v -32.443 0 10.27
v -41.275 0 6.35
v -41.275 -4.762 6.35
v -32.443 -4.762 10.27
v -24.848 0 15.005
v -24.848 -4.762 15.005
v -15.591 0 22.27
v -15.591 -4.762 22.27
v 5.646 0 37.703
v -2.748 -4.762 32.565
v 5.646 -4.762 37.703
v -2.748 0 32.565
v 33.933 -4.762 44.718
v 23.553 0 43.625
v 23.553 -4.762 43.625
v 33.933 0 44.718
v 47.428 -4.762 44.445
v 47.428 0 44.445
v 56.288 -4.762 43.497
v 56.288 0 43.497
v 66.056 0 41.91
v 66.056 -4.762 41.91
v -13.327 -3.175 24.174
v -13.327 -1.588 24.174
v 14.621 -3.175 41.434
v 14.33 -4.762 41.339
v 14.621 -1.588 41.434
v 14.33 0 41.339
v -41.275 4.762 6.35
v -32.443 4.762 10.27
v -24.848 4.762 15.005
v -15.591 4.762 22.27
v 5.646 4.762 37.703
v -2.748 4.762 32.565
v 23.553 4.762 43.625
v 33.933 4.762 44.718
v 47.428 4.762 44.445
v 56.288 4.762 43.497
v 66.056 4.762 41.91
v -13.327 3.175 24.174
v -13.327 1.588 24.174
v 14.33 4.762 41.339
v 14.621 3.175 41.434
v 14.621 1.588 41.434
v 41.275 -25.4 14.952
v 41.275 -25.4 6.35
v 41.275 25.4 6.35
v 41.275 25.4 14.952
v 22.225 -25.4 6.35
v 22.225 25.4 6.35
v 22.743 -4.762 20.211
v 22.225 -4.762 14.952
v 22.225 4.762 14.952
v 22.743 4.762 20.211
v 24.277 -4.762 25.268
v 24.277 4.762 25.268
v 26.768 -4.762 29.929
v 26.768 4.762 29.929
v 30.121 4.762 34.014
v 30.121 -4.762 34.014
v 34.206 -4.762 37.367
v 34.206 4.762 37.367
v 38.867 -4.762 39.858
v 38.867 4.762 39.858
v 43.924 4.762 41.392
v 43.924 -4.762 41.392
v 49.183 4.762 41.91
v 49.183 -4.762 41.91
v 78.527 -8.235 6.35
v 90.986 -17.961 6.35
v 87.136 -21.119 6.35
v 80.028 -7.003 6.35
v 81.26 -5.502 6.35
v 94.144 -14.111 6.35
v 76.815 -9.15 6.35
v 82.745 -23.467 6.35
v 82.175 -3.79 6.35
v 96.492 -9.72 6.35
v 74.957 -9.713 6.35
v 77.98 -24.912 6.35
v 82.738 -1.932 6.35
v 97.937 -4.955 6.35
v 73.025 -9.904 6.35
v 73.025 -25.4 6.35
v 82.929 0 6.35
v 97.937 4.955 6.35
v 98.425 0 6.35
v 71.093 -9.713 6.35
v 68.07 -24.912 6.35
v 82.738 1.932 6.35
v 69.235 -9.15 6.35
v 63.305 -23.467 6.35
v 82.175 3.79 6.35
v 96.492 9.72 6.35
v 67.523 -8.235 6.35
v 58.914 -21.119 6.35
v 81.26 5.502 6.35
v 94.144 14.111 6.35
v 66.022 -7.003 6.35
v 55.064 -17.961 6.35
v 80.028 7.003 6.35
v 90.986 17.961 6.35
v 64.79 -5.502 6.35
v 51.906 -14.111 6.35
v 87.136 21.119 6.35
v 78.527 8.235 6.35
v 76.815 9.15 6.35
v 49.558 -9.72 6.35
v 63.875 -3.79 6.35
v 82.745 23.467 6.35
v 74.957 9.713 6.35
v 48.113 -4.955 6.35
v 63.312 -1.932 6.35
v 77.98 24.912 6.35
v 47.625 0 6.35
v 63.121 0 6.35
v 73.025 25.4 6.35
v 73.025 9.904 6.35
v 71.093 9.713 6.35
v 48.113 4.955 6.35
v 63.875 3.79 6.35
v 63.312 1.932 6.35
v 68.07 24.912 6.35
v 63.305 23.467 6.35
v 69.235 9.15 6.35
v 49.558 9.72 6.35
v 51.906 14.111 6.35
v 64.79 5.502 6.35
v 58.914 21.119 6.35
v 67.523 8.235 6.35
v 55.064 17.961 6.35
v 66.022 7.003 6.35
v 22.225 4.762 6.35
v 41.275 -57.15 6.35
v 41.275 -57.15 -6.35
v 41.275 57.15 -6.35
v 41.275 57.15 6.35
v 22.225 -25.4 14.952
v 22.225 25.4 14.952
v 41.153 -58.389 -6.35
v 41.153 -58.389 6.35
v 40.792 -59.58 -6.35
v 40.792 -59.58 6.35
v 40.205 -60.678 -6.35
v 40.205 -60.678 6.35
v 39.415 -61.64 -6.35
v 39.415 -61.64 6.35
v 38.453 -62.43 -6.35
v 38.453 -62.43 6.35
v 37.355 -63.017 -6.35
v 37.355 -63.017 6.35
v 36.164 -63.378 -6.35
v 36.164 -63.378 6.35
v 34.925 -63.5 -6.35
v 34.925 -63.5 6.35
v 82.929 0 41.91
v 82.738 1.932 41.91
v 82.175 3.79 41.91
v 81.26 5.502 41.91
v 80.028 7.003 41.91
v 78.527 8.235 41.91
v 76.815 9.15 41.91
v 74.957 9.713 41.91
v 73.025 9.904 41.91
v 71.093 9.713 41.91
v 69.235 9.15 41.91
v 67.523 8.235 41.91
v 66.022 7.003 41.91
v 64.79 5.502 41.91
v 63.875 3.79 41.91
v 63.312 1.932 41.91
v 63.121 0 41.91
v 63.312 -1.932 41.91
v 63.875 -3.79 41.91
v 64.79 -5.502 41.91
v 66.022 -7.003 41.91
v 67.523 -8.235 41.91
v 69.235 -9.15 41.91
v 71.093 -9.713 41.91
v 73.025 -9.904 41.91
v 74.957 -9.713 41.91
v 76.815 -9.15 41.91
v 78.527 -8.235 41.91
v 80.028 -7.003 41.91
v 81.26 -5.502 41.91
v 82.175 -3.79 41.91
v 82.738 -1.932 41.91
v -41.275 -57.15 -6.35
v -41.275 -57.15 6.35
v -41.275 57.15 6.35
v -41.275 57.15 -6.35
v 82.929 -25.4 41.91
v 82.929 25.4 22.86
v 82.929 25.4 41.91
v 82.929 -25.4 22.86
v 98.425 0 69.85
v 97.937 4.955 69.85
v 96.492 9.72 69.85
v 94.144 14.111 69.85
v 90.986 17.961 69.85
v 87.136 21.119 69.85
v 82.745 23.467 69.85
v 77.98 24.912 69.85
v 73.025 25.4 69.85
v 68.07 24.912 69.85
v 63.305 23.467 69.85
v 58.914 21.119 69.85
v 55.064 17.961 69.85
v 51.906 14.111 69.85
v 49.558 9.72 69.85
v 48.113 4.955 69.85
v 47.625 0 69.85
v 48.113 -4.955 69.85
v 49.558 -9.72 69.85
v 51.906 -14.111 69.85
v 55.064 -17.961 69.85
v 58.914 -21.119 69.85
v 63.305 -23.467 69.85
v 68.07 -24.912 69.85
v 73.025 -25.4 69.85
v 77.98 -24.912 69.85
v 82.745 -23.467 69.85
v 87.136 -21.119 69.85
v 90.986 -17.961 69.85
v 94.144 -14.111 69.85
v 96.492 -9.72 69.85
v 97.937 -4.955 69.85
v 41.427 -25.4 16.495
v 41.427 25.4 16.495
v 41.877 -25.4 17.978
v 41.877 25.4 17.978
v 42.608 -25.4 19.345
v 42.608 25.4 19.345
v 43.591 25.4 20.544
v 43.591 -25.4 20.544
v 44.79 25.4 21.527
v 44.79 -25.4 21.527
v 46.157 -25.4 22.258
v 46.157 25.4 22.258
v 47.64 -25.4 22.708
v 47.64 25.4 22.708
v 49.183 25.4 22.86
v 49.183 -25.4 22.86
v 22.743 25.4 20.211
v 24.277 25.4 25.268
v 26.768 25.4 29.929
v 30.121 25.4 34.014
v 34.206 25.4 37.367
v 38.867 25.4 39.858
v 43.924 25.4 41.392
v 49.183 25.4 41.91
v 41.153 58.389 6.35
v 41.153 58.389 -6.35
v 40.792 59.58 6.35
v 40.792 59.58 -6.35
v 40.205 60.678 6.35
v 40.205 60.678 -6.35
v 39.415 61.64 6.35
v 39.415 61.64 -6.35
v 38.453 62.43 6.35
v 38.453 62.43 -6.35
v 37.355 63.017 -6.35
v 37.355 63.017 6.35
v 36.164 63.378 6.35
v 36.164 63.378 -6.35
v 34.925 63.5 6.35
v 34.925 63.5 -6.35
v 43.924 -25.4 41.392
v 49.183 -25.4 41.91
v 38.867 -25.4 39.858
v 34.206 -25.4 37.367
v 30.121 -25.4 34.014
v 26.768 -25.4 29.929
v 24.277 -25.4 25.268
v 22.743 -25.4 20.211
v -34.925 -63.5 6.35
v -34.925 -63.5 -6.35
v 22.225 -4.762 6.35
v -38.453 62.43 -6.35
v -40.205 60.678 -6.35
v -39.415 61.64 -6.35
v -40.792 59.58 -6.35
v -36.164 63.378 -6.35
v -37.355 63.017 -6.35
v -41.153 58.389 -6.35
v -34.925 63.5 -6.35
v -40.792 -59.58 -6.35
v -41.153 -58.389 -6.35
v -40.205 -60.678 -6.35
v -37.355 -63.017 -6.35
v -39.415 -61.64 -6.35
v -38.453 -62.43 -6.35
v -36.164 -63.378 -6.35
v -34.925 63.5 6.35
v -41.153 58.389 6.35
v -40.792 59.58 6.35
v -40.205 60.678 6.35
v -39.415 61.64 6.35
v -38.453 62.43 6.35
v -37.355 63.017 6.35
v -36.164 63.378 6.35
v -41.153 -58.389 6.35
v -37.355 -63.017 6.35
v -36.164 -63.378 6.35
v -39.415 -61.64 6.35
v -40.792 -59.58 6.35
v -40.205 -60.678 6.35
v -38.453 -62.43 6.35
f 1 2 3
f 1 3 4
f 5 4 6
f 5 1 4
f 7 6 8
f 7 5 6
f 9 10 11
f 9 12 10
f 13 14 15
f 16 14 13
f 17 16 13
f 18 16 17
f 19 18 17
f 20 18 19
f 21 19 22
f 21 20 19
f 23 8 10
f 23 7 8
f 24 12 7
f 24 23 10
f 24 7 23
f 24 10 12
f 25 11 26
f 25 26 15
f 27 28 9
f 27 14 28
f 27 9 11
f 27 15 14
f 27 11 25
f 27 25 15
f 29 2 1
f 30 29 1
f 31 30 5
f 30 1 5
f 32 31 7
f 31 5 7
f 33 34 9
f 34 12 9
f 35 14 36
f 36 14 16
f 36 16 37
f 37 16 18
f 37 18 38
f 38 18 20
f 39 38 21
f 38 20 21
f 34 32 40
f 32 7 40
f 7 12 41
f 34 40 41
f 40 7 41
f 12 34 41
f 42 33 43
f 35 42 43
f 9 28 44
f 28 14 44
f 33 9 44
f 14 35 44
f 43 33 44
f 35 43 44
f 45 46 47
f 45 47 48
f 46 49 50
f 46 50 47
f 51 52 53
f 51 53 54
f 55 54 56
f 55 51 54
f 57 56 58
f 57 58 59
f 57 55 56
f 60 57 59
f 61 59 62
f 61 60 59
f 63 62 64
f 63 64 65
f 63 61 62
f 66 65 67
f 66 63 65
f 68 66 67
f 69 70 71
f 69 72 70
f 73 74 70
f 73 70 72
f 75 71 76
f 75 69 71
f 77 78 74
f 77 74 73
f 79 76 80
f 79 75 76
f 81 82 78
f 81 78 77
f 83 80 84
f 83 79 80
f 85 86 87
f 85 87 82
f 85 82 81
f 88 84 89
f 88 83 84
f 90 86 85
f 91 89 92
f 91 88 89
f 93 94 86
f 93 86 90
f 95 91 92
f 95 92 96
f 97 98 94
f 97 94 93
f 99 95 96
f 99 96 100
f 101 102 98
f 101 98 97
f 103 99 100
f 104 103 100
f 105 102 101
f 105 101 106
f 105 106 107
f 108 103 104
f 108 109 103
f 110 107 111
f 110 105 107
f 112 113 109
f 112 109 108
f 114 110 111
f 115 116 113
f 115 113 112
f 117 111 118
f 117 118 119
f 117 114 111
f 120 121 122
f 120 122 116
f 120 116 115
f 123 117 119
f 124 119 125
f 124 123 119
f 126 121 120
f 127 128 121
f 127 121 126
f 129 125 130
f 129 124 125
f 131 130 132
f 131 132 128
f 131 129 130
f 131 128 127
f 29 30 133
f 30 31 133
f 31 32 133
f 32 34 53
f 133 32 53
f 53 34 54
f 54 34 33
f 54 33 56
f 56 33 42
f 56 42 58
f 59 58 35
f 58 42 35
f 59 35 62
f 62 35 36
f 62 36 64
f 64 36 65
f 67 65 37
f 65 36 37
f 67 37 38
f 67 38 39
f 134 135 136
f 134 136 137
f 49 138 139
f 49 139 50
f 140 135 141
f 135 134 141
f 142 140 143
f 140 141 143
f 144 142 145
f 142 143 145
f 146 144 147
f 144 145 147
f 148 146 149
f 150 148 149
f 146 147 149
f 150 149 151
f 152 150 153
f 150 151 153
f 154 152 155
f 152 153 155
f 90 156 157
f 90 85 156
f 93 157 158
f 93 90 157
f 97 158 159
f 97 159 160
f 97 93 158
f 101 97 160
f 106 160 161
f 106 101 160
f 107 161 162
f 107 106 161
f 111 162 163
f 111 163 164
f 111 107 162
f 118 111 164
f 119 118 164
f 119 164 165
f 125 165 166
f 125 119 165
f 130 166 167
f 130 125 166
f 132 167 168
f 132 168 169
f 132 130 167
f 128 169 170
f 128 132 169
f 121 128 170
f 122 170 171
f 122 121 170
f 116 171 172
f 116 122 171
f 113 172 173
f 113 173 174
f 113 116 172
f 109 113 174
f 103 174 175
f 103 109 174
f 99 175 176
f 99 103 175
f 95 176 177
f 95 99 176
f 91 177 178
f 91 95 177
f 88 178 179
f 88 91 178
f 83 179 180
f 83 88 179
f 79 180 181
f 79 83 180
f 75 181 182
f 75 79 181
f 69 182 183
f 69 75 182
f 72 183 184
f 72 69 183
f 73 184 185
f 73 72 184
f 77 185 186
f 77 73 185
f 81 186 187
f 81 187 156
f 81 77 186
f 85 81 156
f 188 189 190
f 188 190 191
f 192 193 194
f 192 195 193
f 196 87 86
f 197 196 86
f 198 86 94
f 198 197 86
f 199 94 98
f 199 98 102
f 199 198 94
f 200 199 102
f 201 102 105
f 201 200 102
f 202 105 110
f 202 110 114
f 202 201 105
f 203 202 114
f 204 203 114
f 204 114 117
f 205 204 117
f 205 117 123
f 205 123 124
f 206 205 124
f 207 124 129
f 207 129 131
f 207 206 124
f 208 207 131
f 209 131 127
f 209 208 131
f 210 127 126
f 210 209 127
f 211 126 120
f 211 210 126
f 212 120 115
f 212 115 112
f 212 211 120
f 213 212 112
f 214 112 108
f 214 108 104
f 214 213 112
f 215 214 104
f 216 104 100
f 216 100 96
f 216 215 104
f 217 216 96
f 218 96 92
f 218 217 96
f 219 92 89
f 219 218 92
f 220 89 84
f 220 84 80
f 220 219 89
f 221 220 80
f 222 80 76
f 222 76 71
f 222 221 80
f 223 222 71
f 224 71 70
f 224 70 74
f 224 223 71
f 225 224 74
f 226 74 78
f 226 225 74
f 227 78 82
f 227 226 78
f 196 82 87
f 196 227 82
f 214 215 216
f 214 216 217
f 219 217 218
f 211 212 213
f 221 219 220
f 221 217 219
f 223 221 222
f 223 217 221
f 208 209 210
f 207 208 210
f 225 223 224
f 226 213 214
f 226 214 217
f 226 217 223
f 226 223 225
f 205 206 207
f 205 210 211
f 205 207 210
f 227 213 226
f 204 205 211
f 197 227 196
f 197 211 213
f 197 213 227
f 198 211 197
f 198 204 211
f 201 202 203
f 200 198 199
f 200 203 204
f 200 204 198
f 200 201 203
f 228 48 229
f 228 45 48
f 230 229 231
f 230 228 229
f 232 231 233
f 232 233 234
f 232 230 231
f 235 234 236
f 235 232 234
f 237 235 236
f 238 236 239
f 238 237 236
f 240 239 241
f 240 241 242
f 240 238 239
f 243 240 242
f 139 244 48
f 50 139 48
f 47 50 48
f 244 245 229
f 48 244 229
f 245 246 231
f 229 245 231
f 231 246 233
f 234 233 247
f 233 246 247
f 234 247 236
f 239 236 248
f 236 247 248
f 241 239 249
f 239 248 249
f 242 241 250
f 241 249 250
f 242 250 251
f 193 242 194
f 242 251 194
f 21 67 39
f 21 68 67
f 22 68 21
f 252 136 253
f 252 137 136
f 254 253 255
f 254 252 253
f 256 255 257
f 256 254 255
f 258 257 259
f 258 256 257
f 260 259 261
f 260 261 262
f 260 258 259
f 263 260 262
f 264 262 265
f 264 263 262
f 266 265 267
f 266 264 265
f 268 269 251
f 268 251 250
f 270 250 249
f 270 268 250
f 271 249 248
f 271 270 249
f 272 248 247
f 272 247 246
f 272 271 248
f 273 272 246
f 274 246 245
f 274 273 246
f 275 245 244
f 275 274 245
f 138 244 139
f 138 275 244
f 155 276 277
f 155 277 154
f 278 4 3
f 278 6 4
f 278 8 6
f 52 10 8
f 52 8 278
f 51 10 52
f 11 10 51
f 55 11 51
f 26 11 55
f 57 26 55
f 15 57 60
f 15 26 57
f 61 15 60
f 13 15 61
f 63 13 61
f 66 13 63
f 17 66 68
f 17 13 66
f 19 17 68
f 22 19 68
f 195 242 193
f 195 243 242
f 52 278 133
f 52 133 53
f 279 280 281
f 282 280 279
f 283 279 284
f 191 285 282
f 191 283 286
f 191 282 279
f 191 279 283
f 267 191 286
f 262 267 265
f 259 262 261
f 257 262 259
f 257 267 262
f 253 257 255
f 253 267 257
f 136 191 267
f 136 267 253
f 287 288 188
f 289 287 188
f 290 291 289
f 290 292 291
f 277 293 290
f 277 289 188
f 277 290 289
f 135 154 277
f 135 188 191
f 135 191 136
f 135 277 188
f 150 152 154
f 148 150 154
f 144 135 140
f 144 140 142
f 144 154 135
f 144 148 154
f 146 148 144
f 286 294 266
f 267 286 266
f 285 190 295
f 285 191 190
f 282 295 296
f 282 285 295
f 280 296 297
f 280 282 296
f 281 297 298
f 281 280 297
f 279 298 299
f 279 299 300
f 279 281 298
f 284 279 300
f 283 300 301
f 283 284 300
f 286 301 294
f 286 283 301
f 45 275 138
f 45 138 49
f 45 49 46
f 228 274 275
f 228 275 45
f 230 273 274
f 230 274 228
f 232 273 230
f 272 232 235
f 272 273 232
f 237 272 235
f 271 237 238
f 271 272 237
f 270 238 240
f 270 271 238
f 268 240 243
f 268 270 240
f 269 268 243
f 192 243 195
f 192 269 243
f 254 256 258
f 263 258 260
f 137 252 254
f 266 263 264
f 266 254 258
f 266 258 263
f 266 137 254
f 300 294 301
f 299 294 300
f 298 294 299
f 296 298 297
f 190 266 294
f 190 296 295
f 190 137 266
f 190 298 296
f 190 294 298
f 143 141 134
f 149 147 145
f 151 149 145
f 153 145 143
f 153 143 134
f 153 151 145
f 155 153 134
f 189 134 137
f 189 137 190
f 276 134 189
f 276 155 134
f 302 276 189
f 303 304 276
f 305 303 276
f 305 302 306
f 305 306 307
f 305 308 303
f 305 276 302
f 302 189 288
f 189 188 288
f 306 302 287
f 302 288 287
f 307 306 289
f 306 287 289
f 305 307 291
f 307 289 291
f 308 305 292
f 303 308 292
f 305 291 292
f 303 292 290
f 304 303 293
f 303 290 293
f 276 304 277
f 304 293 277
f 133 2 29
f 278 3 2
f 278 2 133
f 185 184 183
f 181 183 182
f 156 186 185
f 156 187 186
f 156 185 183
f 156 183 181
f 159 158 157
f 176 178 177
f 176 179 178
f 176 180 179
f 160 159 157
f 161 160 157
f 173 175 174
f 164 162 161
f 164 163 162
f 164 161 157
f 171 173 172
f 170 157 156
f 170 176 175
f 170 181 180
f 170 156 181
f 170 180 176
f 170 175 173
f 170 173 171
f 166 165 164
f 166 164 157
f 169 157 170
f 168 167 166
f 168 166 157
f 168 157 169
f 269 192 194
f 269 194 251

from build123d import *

# Parameters (mm, degrees)
F1_DEPTH = 63.5
F2_DEPTH = 4.7625
F0_W     = 9.9037646581
F0_H     = 19.05
F3_DEPTH = 25.4
F0_H_2   = 27.94
F5_R     = 6.35


with BuildPart() as f1:
    # F0 (on Front) → F1 (new body, symmetric)
    with BuildSketch(Plane.XZ):
        Polygon((41.275, -6.35), (41.275, 6.35), (22.225, 6.35), (-41.275, 6.35), (-41.275, -6.35), align=None)
    extrude(amount=F1_DEPTH, both=True)

    # F5
    f5_edges = [f1.edges().sort_by_distance(p)[0] for p in [
        (41.275, -63.5, 0),
        (-41.275, 63.5, 0),
        (-41.275, -63.5, 0),
        (41.275, 63.5, 0),
    ]]
    fillet(f5_edges, radius=F5_R)


with BuildPart() as f2:
    # F0 (on Front) → F2 (new body, symmetric)
    with BuildSketch(Plane.XZ):
        with BuildLine():
            Line((-41.275, 6.35), (22.225, 6.35))
            Line((22.225, 6.35), (22.225, 14.9517957091))
            ThreePointArc((22.225, 14.9517957091), (30.1208752282, 34.0141247718), (49.1832042909, 41.91))
            Line((49.1832042909, 41.91), (66.0559844745, 41.91))
            add(Edge.make_bspline(
                [(-41.275, 6.35), (-5.4980051752, 19.05), (-4.9508991651, 55.2328024244), (66.0559844745, 41.91)],
                knots=[0, 0, 0, 0, 113.0683590942, 113.0683590942, 113.0683590942, 113.0683590942], degree=3))
        make_face()
    extrude(amount=F2_DEPTH, both=True)


with BuildPart() as f3:
    # F0 (on Front) → F3 (new body, symmetric)
    with BuildSketch(Plane.XZ):
        with Locations((77.976882329, 32.385)):
            Rectangle(F0_W, F0_H)
        with BuildLine():
            Line((22.225, 6.35), (41.275, 6.35))
            Line((41.275, 6.35), (41.275, 14.9517957091))
            ThreePointArc((41.275, 14.9517957091), (43.5912594098, 20.5437405902), (49.1832042909, 22.86))
            Line((49.1832042909, 22.86), (73.025, 22.86))
            Line((73.025, 22.86), (73.025, 41.91))
            Line((73.025, 41.91), (66.0559844745, 41.91))
            Line((66.0559844745, 41.91), (49.1832042909, 41.91))
            ThreePointArc((49.1832042909, 41.91), (30.1208752282, 34.0141247718), (22.225, 14.9517957091))
            Line((22.225, 14.9517957091), (22.225, 6.35))
        make_face()
    extrude(amount=F3_DEPTH, both=True)


with BuildPart() as f4:
    # F0 (on Front) → F4 (revolve)
    with BuildSketch(Plane.XZ):
        Polygon((82.9287646581, 41.91), (82.9287646581, 22.86), (82.9287646581, 6.35), (98.425, 6.35), (98.425, 69.85), (82.9287646581, 69.85), align=None)
        with Locations((77.976882329, 55.88)):
            Rectangle(F0_W, F0_H_2)
    revolve(axis=Axis((73.025, 0, 38.1), (0, 0, 1)))


solid = Compound([f1.part, f2.part, f3.part, f4.part])
